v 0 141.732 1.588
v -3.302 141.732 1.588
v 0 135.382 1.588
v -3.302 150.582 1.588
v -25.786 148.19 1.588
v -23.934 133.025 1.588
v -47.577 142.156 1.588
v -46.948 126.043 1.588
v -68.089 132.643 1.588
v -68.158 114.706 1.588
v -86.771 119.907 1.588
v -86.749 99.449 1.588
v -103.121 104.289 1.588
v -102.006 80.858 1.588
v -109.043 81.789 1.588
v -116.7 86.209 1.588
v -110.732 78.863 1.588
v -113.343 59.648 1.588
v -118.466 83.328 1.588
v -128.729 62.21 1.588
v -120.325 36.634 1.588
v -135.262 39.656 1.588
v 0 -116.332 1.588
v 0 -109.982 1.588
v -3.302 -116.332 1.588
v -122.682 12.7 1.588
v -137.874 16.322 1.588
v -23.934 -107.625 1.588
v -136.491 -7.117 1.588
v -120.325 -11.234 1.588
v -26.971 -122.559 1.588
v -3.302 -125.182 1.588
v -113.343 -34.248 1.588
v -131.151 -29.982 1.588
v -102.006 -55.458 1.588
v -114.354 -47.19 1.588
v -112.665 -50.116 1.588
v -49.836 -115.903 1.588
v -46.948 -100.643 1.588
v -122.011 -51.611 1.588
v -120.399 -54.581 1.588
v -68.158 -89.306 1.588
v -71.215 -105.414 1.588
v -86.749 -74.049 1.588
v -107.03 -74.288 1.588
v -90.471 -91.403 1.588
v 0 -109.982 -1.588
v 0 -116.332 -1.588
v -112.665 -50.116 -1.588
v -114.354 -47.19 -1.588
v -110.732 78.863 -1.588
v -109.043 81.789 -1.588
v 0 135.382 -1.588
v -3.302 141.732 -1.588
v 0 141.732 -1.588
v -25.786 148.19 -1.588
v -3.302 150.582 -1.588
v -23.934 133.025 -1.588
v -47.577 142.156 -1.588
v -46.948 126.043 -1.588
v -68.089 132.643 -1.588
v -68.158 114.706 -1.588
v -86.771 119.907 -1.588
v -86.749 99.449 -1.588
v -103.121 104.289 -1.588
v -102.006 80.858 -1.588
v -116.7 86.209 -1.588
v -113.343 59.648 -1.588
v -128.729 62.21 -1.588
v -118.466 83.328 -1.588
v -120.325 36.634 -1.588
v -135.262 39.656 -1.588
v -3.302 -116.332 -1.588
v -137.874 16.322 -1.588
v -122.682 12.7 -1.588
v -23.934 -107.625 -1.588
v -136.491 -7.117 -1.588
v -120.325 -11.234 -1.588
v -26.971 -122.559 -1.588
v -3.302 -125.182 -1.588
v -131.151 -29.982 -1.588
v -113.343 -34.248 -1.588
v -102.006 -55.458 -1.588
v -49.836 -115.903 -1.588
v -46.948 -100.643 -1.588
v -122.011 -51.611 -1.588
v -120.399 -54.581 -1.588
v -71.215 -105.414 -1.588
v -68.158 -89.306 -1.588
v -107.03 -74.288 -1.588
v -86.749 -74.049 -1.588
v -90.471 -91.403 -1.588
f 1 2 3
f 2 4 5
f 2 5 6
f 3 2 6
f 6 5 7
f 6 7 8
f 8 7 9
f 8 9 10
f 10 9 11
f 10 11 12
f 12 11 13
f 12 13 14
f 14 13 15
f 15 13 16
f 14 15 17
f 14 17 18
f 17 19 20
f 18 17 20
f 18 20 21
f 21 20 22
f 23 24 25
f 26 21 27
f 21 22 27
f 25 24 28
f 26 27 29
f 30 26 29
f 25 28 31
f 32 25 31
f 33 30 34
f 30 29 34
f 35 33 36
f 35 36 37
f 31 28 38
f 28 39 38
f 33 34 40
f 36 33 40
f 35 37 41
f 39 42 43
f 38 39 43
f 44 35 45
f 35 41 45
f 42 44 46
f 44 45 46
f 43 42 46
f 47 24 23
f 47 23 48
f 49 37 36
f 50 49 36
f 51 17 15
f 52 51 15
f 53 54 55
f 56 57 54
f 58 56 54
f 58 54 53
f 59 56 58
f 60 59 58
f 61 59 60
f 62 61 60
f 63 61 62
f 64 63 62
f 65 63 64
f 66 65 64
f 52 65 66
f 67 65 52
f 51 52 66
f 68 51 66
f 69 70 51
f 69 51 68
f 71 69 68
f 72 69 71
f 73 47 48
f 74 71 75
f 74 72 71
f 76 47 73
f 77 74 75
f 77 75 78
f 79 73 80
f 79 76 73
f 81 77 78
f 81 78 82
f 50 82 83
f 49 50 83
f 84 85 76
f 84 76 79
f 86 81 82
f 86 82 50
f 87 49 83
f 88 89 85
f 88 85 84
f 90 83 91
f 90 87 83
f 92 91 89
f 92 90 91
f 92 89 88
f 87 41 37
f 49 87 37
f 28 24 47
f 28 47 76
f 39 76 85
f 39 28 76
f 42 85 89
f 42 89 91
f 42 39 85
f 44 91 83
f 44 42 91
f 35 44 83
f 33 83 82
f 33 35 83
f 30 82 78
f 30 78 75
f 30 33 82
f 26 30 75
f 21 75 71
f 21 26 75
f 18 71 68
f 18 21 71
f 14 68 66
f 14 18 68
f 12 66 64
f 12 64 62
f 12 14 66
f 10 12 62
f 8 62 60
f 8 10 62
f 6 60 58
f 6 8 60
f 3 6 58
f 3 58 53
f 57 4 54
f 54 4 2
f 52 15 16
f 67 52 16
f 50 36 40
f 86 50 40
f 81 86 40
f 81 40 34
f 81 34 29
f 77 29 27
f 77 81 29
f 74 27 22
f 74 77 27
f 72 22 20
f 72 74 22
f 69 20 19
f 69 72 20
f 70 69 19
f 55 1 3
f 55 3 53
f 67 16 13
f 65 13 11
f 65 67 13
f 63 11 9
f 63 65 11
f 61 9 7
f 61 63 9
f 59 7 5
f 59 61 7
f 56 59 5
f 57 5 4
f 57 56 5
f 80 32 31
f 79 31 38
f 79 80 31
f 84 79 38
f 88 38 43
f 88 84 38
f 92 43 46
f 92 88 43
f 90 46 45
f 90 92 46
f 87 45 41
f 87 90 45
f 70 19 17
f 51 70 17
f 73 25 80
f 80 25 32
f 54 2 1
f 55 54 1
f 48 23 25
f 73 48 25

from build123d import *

# Parameters (mm, degrees)
SKETCH2_R           = 137.922
SKETCH2_R_2         = 122.682
BOSS_EXTRUDE2_DEPTH = 1.5875
SKETCH3_W           = 290.977734258
SKETCH3_H           = 504.828840158
CUT_EXTRUDE1_DEPTH  = 138.922
CUT_EXTRUDE2_DEPTH  = 4.175


with BuildPart() as part:
    # Sketch2 → Boss-Extrude2 (new body, symmetric)
    with BuildSketch(Plane(origin=(248.273568551, -245.01347209, 0), x_dir=(0, -1, 0), z_dir=(0, 0, -1))):
        with Locations((-257.71347209, 248.273568551)):
            Circle(SKETCH2_R)
        with Locations((-257.71347209, 248.273568551)):
            Circle(SKETCH2_R_2, mode=Mode.SUBTRACT)
    extrude(amount=BOSS_EXTRUDE2_DEPTH, both=True)

    # Sketch3 → Cut-Extrude1 (cut, through all)
    with BuildSketch(Plane(origin=(0, 0, 0), x_dir=(0, 0, -1), z_dir=(1, 0, 0))):
        with Locations((4.206907001, 10.947122083)):
            Rectangle(SKETCH3_W, SKETCH3_H)
    extrude(amount=CUT_EXTRUDE1_DEPTH, mode=Mode.SUBTRACT)

    # Sketch5 → Cut-Extrude2 (cut, through all)
    with BuildSketch(Plane.XY.offset(1.5875)):
        with BuildLine():
            Line((-3.302, 150.582467631), (-3.302, 141.732))
            Line((-3.302, 141.732), (0, 141.732))
            Line((0, 141.732), (0, 150.622))
            ThreePointArc((0, 150.622), (-1.651118319, 150.612116554), (-3.302, 150.582467631))
        make_face()
        with BuildLine():
            Line((-109.043255392, 81.788598611), (-116.699944513, 86.209190137))
            ThreePointArc((-116.699944513, 86.209190137), (-117.591747875, 84.773982239), (-118.465901574, 83.327956562))
            Line((-118.465901574, 83.327956562), (-110.732355392, 78.862991592))
            Line((-110.732355392, 78.862991592), (-109.043255392, 81.788598611))
        make_face()
        with BuildLine():
            Line((-114.354109205, -47.189929975), (-122.010798327, -51.610521501))
            ThreePointArc((-122.010798327, -51.610521501), (-121.213773508, -53.100449816), (-120.398555388, -54.580501964))
            Line((-120.398555388, -54.580501964), (-112.665009205, -50.115536994))
            Line((-112.665009205, -50.115536994), (-114.354109205, -47.189929975))
        make_face()
        with BuildLine():
            Line((-3.302, -116.332), (-3.302, -125.182467631))
            ThreePointArc((-3.302, -125.182467631), (-1.651118319, -125.212116554), (0, -125.222))
            Line((0, -125.222), (0, -116.332))
            Line((0, -116.332), (-3.302, -116.332))
        make_face()
    extrude(amount=-CUT_EXTRUDE2_DEPTH, mode=Mode.SUBTRACT)


solid = part.part
